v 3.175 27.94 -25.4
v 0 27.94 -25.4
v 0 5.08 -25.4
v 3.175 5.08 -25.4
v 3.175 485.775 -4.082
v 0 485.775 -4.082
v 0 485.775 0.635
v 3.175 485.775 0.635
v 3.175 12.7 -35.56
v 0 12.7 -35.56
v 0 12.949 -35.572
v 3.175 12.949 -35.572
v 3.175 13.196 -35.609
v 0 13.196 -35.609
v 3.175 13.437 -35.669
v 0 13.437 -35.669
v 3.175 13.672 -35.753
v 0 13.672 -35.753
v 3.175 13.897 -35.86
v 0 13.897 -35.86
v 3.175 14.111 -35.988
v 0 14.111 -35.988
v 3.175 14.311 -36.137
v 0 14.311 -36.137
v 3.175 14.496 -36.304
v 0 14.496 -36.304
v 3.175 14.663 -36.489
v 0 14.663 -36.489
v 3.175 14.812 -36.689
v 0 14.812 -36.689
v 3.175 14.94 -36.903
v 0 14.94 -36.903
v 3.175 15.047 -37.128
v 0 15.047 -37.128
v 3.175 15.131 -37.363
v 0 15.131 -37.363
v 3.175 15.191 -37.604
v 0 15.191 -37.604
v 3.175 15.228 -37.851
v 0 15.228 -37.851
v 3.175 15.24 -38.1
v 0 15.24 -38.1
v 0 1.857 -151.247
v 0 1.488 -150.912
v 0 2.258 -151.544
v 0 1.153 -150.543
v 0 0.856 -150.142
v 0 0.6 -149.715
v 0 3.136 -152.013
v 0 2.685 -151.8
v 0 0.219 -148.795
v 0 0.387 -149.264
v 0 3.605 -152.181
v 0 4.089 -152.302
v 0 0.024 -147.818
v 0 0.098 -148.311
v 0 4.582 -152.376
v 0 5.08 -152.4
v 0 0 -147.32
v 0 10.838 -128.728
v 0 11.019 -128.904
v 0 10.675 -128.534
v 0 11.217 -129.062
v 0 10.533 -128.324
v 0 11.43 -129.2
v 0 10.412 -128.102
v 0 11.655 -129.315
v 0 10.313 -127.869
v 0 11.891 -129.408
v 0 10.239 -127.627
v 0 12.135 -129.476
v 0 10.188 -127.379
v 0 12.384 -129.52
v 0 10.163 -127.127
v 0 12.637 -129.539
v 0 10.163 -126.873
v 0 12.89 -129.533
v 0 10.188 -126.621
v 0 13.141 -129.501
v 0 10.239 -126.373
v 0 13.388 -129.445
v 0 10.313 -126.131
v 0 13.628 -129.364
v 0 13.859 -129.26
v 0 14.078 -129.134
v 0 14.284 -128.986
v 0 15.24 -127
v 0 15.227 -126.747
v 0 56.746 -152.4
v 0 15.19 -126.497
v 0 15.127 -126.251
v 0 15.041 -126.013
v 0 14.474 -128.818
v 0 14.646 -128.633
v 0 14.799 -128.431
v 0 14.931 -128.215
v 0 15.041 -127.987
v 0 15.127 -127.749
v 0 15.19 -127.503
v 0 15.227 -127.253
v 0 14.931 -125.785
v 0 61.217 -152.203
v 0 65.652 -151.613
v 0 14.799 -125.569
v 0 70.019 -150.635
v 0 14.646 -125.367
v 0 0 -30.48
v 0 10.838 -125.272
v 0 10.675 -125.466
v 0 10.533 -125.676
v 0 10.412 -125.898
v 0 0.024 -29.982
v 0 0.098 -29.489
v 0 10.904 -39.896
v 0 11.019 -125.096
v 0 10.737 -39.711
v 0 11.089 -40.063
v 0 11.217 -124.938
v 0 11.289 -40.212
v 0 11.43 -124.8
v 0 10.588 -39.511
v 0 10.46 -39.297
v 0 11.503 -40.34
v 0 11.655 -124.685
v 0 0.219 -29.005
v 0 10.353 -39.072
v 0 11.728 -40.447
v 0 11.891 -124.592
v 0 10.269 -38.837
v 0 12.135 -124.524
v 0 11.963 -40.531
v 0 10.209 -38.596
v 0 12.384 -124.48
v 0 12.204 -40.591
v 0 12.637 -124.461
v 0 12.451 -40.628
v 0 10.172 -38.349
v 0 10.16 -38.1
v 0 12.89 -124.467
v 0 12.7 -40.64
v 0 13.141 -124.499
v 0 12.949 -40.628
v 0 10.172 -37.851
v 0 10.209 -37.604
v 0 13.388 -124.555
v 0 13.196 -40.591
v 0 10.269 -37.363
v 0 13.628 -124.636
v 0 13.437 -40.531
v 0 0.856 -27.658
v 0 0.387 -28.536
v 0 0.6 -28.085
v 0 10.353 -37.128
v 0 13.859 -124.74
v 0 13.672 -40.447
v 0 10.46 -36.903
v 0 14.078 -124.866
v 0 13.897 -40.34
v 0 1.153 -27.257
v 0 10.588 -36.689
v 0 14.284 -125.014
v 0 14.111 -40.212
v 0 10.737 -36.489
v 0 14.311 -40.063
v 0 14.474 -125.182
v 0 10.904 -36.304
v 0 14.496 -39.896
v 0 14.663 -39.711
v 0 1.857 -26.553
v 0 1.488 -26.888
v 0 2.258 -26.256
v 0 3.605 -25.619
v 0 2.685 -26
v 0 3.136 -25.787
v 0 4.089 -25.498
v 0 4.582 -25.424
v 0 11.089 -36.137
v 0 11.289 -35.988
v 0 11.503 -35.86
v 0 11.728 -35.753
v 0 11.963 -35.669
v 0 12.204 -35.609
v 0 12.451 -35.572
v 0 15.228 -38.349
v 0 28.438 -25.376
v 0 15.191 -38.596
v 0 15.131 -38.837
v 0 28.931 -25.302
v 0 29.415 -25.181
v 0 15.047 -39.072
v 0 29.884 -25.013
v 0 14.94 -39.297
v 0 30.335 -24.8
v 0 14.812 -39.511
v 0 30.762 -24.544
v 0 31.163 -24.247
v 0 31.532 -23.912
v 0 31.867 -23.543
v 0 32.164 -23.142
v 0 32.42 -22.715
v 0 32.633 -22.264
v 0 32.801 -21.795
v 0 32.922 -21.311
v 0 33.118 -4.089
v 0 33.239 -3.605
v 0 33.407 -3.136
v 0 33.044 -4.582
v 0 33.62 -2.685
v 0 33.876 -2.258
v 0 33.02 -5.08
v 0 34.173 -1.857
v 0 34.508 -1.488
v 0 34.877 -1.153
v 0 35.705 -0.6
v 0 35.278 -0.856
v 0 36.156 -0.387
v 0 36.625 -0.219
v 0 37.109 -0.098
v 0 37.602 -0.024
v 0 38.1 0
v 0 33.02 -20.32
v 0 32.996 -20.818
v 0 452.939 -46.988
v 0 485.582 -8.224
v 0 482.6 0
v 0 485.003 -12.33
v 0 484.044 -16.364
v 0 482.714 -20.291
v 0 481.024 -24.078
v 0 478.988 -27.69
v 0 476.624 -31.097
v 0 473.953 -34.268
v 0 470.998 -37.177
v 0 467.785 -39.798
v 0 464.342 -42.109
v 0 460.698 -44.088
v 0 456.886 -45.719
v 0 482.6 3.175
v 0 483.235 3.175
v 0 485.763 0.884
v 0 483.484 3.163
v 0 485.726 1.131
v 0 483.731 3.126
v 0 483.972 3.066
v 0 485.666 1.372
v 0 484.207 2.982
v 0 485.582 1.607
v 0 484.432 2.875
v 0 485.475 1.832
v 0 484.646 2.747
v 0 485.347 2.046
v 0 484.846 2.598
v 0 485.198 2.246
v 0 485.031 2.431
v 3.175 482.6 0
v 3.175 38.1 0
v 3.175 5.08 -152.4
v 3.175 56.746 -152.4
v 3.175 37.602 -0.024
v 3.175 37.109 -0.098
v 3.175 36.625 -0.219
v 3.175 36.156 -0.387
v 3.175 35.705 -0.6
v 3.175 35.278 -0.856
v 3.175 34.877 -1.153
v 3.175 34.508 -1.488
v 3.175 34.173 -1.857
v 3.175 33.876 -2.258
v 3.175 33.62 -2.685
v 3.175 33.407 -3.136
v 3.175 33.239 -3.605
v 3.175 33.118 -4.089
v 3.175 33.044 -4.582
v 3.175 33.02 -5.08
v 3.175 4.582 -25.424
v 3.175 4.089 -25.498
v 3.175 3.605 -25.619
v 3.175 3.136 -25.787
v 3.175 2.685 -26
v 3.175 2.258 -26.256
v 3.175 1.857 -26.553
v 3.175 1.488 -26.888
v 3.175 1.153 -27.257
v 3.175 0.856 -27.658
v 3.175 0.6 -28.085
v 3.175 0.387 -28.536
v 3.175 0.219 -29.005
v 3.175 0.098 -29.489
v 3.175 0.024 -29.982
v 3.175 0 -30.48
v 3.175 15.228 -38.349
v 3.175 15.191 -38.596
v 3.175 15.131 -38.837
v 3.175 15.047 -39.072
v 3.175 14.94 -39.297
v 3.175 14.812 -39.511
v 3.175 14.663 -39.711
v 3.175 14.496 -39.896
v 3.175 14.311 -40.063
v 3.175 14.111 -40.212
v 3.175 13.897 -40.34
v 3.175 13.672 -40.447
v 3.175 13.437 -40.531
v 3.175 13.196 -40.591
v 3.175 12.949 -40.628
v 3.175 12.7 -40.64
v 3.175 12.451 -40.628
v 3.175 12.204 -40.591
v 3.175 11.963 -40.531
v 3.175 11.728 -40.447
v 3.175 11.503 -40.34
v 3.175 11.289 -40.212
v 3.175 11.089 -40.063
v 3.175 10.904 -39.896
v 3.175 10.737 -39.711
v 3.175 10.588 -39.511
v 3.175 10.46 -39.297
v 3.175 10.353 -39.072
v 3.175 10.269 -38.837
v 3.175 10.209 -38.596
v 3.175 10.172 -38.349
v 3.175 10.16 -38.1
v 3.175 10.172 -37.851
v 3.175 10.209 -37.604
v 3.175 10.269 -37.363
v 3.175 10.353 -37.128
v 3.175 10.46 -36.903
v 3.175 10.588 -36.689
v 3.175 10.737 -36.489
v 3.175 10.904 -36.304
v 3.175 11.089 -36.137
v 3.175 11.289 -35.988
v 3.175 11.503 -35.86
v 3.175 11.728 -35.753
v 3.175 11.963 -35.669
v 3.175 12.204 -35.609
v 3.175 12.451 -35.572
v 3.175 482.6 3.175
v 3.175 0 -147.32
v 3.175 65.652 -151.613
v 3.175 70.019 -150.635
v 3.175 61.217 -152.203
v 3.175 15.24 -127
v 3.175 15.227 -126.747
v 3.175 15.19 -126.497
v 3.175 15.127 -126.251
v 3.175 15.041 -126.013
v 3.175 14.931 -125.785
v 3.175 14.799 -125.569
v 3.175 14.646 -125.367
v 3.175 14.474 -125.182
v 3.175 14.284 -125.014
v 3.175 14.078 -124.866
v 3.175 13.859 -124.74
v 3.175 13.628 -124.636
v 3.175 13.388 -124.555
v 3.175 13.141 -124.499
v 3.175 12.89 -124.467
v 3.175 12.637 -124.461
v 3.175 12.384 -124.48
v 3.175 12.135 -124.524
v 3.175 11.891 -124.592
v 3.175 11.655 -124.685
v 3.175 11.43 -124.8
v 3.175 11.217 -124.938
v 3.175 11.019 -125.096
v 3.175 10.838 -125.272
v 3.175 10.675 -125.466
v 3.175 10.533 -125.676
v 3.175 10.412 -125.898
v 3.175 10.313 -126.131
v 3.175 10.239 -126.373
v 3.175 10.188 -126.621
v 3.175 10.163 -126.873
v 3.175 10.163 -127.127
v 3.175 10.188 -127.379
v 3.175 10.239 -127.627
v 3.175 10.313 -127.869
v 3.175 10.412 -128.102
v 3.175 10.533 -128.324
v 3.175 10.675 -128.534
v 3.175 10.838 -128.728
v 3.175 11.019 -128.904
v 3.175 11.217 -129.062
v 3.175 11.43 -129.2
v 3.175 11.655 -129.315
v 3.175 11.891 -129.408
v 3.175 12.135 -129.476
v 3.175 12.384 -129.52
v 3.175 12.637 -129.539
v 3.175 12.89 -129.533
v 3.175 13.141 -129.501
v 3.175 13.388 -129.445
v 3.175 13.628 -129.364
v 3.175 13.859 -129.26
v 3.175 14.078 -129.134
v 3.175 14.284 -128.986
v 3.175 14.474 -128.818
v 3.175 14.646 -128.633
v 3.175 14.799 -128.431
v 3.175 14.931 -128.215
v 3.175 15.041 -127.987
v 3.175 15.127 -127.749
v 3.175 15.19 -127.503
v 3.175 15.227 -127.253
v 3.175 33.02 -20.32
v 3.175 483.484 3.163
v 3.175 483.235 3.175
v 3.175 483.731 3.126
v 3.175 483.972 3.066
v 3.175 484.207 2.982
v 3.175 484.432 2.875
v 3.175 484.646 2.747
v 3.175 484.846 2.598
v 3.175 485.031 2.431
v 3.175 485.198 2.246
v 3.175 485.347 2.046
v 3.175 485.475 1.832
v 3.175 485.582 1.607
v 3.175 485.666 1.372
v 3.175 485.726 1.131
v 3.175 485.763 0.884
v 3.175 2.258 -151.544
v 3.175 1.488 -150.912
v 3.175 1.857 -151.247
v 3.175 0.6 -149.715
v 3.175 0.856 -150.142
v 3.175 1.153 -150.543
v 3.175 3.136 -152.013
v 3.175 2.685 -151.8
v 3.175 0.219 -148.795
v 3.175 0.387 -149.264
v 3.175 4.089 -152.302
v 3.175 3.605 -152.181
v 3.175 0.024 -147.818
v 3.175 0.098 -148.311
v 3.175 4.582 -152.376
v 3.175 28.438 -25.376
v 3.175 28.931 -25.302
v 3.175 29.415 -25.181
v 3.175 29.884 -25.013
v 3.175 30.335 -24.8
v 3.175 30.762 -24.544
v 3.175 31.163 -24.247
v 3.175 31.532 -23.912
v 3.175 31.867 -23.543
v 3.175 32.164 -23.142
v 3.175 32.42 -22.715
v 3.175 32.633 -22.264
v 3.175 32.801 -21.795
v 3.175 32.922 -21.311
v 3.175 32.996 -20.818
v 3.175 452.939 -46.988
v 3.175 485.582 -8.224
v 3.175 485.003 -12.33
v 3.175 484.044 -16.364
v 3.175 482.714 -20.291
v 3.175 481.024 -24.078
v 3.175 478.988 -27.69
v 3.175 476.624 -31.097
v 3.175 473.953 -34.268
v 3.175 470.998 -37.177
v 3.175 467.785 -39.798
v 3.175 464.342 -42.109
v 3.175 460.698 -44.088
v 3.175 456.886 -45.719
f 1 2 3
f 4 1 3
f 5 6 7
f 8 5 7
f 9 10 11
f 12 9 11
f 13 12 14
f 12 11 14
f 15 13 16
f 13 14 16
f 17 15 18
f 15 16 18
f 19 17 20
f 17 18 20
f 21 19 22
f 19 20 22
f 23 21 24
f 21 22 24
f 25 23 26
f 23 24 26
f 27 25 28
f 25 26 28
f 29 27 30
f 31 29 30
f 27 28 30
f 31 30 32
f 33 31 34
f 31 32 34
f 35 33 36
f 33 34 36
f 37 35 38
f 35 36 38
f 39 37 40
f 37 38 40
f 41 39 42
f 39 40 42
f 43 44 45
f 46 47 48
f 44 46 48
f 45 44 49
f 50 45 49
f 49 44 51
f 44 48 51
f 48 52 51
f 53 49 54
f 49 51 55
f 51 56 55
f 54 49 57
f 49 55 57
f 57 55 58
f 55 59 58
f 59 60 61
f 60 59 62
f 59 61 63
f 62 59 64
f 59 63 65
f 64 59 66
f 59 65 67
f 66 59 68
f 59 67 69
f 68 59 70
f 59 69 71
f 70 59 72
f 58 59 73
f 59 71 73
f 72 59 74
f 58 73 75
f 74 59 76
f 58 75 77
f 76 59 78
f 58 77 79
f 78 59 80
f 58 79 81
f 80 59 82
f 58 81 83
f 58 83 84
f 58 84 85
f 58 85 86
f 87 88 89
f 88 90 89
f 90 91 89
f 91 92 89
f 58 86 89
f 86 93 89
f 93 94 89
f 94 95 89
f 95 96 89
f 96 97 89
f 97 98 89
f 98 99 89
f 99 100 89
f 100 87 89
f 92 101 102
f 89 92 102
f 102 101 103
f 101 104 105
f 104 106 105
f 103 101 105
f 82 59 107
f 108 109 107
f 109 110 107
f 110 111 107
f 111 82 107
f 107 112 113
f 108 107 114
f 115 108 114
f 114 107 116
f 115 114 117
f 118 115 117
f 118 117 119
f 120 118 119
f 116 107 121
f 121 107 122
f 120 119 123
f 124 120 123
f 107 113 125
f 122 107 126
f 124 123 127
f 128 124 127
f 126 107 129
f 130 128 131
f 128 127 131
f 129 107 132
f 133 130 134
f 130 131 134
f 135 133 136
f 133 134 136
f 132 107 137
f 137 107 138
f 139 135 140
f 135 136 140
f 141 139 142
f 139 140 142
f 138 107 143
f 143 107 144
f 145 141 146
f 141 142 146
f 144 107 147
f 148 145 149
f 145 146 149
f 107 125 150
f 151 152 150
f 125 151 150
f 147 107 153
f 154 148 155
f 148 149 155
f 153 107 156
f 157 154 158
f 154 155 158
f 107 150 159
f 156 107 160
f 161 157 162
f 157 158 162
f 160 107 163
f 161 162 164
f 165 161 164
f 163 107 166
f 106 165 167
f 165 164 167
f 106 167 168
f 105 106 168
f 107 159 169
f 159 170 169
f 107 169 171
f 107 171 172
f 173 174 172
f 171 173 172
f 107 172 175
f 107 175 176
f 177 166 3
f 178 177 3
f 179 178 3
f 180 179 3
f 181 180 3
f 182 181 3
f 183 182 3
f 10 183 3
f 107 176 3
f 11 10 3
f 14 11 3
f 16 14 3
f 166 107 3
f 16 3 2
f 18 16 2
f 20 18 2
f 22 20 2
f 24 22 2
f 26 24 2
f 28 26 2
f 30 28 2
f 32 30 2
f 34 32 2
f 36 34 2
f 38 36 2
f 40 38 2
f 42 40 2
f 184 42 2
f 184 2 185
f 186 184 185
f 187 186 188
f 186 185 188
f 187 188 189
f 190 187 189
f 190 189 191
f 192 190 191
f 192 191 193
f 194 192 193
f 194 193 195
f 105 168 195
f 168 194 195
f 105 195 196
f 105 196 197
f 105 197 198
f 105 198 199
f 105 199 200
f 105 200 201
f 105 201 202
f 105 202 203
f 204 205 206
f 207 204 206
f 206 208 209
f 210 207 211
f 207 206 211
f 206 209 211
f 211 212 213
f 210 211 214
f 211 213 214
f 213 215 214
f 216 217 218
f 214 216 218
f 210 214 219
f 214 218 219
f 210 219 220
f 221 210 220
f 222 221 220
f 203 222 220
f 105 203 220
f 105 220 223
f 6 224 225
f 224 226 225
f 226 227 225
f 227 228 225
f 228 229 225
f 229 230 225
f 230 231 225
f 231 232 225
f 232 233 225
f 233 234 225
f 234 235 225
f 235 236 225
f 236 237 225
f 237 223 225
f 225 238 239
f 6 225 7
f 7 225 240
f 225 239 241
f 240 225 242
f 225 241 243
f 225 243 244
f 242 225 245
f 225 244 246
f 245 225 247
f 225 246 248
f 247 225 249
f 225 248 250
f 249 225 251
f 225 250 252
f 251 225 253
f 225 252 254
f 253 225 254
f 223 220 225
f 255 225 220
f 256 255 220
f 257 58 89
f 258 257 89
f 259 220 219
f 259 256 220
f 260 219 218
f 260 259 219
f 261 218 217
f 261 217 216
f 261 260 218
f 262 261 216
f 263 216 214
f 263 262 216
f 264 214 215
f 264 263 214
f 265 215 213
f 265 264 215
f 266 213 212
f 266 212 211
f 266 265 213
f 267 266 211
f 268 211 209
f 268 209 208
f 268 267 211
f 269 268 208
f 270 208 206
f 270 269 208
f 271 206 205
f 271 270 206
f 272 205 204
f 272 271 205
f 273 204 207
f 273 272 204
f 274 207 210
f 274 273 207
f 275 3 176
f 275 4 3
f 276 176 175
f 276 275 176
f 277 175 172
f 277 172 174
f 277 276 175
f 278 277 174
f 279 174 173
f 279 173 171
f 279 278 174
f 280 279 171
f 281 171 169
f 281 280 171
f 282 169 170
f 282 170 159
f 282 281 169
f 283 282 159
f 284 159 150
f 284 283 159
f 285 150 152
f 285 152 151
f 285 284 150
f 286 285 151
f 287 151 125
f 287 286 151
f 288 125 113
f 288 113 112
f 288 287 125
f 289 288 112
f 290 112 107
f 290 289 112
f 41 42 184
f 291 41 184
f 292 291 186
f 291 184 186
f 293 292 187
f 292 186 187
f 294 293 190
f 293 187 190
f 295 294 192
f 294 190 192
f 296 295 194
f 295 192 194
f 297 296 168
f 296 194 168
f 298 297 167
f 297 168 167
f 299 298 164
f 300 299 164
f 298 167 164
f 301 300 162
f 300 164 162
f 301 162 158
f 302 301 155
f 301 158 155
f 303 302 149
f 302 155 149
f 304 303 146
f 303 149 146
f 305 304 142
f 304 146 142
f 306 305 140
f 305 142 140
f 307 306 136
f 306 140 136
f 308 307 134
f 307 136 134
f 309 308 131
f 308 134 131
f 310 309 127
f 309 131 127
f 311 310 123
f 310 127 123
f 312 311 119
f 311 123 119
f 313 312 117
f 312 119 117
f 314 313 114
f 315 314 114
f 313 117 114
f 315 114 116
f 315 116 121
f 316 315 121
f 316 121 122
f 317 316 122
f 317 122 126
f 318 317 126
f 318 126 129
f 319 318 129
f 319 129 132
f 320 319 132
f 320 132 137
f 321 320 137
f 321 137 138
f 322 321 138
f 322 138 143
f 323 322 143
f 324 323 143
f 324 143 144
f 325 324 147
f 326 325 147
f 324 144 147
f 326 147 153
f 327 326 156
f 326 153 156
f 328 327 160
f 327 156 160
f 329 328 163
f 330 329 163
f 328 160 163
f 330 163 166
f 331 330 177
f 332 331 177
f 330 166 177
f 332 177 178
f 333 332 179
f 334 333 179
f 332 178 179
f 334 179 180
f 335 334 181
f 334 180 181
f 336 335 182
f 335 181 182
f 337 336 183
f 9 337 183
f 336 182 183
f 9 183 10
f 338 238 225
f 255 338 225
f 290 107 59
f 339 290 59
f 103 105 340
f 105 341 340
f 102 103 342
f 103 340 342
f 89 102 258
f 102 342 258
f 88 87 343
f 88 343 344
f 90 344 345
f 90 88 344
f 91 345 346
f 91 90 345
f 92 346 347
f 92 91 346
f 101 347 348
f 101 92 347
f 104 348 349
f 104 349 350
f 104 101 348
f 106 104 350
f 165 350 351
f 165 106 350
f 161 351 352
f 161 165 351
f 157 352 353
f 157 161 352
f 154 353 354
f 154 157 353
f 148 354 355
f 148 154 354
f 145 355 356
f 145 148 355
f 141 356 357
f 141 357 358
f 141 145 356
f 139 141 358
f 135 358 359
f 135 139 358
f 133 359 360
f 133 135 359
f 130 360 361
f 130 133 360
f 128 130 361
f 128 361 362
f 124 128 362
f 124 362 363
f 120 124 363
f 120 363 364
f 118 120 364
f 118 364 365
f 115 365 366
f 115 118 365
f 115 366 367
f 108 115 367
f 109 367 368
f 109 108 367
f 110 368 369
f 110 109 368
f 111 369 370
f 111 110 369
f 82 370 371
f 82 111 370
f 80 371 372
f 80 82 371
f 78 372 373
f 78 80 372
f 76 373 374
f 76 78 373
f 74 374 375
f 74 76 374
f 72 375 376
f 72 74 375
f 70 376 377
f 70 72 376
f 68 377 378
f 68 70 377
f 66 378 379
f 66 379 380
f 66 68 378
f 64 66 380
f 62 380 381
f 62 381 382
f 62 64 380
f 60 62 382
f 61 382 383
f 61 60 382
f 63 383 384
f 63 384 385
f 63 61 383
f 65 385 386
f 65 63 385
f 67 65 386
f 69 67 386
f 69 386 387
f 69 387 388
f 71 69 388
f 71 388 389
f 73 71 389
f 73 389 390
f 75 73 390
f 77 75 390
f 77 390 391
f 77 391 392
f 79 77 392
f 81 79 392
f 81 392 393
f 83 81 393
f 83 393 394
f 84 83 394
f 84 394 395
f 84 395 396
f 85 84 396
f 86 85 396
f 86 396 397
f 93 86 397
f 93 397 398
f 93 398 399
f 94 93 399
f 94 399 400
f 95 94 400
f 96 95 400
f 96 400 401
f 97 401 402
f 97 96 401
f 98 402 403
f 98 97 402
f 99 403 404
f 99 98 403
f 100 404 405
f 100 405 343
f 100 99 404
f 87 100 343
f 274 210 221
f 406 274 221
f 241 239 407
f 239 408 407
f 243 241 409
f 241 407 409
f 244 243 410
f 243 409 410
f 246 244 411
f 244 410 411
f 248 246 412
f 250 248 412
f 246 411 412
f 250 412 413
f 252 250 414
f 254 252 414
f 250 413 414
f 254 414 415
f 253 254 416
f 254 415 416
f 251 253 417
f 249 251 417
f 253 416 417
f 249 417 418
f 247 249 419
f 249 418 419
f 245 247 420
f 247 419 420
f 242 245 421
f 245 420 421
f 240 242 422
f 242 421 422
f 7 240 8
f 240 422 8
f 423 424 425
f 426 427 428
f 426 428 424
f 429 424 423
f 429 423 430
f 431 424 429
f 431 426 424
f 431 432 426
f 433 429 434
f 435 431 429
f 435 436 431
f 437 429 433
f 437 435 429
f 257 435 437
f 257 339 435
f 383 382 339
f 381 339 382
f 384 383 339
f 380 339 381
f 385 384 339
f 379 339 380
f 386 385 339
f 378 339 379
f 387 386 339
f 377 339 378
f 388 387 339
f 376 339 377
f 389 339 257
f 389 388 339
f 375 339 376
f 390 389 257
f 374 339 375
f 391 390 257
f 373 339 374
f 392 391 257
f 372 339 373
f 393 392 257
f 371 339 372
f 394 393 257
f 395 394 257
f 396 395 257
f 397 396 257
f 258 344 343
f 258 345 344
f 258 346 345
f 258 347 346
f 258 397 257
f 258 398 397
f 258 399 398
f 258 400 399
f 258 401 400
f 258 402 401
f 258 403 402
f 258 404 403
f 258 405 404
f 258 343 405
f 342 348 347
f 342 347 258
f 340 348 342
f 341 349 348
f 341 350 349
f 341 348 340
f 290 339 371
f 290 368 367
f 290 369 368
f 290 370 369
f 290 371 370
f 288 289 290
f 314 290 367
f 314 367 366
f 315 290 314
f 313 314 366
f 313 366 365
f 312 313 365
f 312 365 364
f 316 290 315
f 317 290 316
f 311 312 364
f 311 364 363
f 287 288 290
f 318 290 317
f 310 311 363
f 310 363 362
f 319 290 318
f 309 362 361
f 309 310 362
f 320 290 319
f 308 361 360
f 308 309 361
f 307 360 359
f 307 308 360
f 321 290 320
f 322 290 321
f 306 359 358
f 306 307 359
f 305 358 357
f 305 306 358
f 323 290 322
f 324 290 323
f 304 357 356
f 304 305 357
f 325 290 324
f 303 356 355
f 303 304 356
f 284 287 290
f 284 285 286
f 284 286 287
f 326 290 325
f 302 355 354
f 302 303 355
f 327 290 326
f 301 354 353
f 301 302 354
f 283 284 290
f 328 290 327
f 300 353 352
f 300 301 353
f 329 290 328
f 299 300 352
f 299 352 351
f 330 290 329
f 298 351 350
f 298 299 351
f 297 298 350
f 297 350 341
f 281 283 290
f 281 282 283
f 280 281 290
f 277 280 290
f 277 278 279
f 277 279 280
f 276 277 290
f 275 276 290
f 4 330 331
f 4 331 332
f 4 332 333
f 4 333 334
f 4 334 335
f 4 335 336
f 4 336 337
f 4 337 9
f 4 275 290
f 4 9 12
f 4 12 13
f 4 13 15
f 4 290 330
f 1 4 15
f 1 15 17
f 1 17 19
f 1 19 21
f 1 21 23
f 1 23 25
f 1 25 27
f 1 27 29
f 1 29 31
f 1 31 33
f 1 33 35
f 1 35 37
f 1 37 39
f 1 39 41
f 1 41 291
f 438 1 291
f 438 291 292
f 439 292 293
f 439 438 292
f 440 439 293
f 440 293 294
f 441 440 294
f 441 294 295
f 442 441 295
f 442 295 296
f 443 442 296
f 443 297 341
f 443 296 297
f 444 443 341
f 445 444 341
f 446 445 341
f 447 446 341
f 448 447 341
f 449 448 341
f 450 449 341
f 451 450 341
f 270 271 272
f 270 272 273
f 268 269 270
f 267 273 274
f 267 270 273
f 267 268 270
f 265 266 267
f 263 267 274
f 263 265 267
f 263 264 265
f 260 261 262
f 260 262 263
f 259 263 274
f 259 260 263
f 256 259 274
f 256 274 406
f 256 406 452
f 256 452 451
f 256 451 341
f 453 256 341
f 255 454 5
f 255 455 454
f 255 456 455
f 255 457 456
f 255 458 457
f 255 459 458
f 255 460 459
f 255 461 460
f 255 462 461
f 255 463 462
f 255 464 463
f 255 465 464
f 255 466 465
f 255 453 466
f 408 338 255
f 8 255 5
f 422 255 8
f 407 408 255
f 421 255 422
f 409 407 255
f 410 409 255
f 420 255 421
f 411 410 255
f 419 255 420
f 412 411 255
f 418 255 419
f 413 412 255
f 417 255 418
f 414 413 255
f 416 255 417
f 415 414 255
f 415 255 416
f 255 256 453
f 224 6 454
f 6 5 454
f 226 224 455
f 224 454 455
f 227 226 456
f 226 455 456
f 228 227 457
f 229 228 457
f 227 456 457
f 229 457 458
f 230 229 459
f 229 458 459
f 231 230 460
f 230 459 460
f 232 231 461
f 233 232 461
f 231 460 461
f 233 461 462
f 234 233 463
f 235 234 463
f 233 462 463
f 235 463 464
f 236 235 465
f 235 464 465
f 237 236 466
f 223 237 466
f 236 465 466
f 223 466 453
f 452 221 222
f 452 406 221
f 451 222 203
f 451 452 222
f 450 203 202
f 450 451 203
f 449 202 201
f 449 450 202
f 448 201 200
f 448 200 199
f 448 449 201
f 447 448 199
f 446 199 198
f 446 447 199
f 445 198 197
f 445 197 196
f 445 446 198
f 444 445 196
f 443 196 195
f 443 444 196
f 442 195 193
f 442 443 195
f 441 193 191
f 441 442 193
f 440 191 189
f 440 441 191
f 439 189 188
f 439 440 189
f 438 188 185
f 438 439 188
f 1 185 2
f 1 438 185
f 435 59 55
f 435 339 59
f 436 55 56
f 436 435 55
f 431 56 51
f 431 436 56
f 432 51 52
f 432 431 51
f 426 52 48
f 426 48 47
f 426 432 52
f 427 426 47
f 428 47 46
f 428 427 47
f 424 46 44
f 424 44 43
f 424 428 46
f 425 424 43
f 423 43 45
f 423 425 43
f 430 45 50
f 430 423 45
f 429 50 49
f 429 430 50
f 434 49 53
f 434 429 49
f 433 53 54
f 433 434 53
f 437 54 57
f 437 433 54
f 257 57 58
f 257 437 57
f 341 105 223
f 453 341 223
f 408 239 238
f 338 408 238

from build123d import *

# Parameters (mm, degrees)
F0_R     = 2.54
F1_DEPTH = 3.175
F2_R     = 5.08
F3_R     = 2.54
F4_R     = 44.45
F5_R     = 50.8


with BuildPart() as f1:
    # F0 (on Right) → F1 (new body)
    with BuildSketch(Plane.YZ):
        Polygon((482.6, 0), (33.02, 0), (33.02, -25.4), (12.7, -25.4), (0, -25.4), (0, -152.4), (63.5, -152.4), (485.775, -38.1), (485.775, 3.175), (482.6, 3.175), align=None)
        with Locations((12.7, -127)):
            Circle(F0_R, mode=Mode.SUBTRACT)
        with BuildLine():
            ThreePointArc((15.24, -38.1), (10.903949, -39.896051), (12.7, -35.56))
            ThreePointArc((12.7, -35.56), (14.496051, -36.303949), (15.24, -38.1))
        make_face(mode=Mode.SUBTRACT)
    extrude(amount=F1_DEPTH)

    # F2
    f2_edges = [f1.edges().sort_by_distance(p)[0] for p in [
        (1.5875, 0, -152.4),
        (1.5875, 0, -25.4),
        (1.5875, 33.02, 0),
        (1.5875, 33.02, -25.4),
    ]]
    fillet(f2_edges, radius=F2_R)

    # F3
    f3_edges = [f1.edges().sort_by_distance(p)[0] for p in [
        (1.5875, 485.775, 3.175),
    ]]
    fillet(f3_edges, radius=F3_R)

    # F4
    f4_edges = [f1.edges().sort_by_distance(p)[0] for p in [
        (1.5875, 485.775, -38.1),
    ]]
    fillet(f4_edges, radius=F4_R)

    # F5
    f5_edges = [f1.edges().sort_by_distance(p)[0] for p in [
        (1.5875, 63.5, -152.4),
    ]]
    fillet(f5_edges, radius=F5_R)


solid = f1.part
